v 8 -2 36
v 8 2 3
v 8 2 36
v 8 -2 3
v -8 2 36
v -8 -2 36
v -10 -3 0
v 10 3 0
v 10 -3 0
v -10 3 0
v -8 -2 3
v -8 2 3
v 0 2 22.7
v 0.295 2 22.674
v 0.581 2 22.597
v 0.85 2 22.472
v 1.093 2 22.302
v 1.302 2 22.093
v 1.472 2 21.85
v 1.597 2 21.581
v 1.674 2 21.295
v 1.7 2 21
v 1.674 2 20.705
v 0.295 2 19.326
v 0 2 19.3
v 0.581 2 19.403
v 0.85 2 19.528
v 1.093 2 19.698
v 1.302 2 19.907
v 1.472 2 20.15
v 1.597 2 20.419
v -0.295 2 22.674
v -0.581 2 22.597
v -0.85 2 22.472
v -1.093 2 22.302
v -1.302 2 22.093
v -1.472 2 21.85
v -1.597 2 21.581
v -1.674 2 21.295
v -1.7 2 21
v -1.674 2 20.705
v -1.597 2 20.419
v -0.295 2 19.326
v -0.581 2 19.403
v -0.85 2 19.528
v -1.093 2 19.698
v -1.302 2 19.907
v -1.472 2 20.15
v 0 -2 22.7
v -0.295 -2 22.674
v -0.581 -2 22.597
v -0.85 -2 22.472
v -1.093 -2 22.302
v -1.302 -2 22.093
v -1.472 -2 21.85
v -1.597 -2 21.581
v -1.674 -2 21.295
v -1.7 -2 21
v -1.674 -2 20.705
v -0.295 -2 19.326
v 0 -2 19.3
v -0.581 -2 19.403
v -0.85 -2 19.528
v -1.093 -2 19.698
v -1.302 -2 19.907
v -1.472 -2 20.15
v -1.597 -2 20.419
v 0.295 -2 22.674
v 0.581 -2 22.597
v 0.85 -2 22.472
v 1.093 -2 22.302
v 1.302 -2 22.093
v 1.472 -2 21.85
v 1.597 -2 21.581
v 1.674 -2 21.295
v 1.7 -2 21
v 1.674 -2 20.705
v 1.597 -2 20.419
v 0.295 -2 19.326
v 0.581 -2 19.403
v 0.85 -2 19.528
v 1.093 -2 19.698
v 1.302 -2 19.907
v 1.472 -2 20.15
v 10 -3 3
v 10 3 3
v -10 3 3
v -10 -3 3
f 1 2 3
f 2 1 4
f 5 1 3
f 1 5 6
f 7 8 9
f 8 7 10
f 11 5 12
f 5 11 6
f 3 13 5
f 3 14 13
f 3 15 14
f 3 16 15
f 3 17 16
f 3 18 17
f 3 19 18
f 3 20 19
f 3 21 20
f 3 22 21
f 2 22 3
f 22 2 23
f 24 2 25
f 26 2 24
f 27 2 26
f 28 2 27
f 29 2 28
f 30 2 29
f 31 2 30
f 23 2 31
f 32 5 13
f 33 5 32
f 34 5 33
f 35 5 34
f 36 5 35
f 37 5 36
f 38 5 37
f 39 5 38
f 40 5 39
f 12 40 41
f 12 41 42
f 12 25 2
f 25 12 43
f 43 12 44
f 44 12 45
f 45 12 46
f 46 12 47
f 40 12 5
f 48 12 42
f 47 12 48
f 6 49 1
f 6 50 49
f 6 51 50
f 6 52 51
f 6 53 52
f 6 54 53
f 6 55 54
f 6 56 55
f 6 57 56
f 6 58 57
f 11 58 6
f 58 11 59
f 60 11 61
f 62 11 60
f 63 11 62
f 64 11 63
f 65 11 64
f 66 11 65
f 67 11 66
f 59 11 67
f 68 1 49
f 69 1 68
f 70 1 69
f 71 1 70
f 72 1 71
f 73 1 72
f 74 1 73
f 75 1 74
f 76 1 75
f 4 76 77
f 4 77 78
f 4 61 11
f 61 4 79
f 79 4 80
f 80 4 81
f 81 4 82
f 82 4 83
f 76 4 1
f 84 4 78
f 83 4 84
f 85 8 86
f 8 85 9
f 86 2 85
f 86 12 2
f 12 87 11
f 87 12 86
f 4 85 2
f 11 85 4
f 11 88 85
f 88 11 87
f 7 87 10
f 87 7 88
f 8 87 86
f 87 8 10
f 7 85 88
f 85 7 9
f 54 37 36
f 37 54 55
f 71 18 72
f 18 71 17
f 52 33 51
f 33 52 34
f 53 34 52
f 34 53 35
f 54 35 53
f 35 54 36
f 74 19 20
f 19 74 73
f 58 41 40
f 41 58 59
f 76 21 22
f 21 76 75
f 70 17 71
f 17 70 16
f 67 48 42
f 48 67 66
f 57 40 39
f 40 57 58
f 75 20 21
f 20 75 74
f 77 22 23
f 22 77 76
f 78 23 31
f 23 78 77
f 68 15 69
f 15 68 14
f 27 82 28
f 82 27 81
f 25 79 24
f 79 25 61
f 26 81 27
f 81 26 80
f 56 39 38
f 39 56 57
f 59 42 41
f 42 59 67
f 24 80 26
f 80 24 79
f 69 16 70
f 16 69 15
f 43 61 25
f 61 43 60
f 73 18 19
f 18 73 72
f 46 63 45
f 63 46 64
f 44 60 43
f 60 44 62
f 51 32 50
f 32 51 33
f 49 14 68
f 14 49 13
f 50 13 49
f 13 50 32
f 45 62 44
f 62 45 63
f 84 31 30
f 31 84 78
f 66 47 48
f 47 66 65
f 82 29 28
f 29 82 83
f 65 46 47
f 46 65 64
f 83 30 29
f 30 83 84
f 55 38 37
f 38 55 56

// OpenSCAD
// Millimetres. A 3 mm transverse retractable pin retains the spring-loaded sliding flag.
part = "slider";
$fn=36;
module slider() {
  difference() {
    union() {
      translate([-8,-2,0]) cube([16,4,36]);
      translate([-10,-3,0]) cube([20,6,3]);
    }
    translate([0,5,21]) rotate([90,0,0]) cylinder(h=10,d=3.4);
  }
}
module guide() {
  difference() {
    translate([-13,-7,0]) cube([26,14,42]);
    // Service opening underneath for spring and slider. Top shoulder captures its stop foot.
    translate([-10.35,-3.35,-1]) cube([20.7,6.7,37]);
    translate([-8.4,-2.4,35]) cube([16.8,4.8,8]);
    translate([0,8,29]) rotate([90,0,0]) cylinder(h=16,d=3.3);
  }
}
module base() {
  difference() {
    translate([-15,-10,0]) cube([30,20,4]);
    translate([0,0,3]) cylinder(h=2,d=6.5);
    for(x=[-12,12]) translate([x,0,-1]) cylinder(h=6,d=3.2);
  }
}
if(part=="guide") guide();
else if(part=="base") base();
else slider();
